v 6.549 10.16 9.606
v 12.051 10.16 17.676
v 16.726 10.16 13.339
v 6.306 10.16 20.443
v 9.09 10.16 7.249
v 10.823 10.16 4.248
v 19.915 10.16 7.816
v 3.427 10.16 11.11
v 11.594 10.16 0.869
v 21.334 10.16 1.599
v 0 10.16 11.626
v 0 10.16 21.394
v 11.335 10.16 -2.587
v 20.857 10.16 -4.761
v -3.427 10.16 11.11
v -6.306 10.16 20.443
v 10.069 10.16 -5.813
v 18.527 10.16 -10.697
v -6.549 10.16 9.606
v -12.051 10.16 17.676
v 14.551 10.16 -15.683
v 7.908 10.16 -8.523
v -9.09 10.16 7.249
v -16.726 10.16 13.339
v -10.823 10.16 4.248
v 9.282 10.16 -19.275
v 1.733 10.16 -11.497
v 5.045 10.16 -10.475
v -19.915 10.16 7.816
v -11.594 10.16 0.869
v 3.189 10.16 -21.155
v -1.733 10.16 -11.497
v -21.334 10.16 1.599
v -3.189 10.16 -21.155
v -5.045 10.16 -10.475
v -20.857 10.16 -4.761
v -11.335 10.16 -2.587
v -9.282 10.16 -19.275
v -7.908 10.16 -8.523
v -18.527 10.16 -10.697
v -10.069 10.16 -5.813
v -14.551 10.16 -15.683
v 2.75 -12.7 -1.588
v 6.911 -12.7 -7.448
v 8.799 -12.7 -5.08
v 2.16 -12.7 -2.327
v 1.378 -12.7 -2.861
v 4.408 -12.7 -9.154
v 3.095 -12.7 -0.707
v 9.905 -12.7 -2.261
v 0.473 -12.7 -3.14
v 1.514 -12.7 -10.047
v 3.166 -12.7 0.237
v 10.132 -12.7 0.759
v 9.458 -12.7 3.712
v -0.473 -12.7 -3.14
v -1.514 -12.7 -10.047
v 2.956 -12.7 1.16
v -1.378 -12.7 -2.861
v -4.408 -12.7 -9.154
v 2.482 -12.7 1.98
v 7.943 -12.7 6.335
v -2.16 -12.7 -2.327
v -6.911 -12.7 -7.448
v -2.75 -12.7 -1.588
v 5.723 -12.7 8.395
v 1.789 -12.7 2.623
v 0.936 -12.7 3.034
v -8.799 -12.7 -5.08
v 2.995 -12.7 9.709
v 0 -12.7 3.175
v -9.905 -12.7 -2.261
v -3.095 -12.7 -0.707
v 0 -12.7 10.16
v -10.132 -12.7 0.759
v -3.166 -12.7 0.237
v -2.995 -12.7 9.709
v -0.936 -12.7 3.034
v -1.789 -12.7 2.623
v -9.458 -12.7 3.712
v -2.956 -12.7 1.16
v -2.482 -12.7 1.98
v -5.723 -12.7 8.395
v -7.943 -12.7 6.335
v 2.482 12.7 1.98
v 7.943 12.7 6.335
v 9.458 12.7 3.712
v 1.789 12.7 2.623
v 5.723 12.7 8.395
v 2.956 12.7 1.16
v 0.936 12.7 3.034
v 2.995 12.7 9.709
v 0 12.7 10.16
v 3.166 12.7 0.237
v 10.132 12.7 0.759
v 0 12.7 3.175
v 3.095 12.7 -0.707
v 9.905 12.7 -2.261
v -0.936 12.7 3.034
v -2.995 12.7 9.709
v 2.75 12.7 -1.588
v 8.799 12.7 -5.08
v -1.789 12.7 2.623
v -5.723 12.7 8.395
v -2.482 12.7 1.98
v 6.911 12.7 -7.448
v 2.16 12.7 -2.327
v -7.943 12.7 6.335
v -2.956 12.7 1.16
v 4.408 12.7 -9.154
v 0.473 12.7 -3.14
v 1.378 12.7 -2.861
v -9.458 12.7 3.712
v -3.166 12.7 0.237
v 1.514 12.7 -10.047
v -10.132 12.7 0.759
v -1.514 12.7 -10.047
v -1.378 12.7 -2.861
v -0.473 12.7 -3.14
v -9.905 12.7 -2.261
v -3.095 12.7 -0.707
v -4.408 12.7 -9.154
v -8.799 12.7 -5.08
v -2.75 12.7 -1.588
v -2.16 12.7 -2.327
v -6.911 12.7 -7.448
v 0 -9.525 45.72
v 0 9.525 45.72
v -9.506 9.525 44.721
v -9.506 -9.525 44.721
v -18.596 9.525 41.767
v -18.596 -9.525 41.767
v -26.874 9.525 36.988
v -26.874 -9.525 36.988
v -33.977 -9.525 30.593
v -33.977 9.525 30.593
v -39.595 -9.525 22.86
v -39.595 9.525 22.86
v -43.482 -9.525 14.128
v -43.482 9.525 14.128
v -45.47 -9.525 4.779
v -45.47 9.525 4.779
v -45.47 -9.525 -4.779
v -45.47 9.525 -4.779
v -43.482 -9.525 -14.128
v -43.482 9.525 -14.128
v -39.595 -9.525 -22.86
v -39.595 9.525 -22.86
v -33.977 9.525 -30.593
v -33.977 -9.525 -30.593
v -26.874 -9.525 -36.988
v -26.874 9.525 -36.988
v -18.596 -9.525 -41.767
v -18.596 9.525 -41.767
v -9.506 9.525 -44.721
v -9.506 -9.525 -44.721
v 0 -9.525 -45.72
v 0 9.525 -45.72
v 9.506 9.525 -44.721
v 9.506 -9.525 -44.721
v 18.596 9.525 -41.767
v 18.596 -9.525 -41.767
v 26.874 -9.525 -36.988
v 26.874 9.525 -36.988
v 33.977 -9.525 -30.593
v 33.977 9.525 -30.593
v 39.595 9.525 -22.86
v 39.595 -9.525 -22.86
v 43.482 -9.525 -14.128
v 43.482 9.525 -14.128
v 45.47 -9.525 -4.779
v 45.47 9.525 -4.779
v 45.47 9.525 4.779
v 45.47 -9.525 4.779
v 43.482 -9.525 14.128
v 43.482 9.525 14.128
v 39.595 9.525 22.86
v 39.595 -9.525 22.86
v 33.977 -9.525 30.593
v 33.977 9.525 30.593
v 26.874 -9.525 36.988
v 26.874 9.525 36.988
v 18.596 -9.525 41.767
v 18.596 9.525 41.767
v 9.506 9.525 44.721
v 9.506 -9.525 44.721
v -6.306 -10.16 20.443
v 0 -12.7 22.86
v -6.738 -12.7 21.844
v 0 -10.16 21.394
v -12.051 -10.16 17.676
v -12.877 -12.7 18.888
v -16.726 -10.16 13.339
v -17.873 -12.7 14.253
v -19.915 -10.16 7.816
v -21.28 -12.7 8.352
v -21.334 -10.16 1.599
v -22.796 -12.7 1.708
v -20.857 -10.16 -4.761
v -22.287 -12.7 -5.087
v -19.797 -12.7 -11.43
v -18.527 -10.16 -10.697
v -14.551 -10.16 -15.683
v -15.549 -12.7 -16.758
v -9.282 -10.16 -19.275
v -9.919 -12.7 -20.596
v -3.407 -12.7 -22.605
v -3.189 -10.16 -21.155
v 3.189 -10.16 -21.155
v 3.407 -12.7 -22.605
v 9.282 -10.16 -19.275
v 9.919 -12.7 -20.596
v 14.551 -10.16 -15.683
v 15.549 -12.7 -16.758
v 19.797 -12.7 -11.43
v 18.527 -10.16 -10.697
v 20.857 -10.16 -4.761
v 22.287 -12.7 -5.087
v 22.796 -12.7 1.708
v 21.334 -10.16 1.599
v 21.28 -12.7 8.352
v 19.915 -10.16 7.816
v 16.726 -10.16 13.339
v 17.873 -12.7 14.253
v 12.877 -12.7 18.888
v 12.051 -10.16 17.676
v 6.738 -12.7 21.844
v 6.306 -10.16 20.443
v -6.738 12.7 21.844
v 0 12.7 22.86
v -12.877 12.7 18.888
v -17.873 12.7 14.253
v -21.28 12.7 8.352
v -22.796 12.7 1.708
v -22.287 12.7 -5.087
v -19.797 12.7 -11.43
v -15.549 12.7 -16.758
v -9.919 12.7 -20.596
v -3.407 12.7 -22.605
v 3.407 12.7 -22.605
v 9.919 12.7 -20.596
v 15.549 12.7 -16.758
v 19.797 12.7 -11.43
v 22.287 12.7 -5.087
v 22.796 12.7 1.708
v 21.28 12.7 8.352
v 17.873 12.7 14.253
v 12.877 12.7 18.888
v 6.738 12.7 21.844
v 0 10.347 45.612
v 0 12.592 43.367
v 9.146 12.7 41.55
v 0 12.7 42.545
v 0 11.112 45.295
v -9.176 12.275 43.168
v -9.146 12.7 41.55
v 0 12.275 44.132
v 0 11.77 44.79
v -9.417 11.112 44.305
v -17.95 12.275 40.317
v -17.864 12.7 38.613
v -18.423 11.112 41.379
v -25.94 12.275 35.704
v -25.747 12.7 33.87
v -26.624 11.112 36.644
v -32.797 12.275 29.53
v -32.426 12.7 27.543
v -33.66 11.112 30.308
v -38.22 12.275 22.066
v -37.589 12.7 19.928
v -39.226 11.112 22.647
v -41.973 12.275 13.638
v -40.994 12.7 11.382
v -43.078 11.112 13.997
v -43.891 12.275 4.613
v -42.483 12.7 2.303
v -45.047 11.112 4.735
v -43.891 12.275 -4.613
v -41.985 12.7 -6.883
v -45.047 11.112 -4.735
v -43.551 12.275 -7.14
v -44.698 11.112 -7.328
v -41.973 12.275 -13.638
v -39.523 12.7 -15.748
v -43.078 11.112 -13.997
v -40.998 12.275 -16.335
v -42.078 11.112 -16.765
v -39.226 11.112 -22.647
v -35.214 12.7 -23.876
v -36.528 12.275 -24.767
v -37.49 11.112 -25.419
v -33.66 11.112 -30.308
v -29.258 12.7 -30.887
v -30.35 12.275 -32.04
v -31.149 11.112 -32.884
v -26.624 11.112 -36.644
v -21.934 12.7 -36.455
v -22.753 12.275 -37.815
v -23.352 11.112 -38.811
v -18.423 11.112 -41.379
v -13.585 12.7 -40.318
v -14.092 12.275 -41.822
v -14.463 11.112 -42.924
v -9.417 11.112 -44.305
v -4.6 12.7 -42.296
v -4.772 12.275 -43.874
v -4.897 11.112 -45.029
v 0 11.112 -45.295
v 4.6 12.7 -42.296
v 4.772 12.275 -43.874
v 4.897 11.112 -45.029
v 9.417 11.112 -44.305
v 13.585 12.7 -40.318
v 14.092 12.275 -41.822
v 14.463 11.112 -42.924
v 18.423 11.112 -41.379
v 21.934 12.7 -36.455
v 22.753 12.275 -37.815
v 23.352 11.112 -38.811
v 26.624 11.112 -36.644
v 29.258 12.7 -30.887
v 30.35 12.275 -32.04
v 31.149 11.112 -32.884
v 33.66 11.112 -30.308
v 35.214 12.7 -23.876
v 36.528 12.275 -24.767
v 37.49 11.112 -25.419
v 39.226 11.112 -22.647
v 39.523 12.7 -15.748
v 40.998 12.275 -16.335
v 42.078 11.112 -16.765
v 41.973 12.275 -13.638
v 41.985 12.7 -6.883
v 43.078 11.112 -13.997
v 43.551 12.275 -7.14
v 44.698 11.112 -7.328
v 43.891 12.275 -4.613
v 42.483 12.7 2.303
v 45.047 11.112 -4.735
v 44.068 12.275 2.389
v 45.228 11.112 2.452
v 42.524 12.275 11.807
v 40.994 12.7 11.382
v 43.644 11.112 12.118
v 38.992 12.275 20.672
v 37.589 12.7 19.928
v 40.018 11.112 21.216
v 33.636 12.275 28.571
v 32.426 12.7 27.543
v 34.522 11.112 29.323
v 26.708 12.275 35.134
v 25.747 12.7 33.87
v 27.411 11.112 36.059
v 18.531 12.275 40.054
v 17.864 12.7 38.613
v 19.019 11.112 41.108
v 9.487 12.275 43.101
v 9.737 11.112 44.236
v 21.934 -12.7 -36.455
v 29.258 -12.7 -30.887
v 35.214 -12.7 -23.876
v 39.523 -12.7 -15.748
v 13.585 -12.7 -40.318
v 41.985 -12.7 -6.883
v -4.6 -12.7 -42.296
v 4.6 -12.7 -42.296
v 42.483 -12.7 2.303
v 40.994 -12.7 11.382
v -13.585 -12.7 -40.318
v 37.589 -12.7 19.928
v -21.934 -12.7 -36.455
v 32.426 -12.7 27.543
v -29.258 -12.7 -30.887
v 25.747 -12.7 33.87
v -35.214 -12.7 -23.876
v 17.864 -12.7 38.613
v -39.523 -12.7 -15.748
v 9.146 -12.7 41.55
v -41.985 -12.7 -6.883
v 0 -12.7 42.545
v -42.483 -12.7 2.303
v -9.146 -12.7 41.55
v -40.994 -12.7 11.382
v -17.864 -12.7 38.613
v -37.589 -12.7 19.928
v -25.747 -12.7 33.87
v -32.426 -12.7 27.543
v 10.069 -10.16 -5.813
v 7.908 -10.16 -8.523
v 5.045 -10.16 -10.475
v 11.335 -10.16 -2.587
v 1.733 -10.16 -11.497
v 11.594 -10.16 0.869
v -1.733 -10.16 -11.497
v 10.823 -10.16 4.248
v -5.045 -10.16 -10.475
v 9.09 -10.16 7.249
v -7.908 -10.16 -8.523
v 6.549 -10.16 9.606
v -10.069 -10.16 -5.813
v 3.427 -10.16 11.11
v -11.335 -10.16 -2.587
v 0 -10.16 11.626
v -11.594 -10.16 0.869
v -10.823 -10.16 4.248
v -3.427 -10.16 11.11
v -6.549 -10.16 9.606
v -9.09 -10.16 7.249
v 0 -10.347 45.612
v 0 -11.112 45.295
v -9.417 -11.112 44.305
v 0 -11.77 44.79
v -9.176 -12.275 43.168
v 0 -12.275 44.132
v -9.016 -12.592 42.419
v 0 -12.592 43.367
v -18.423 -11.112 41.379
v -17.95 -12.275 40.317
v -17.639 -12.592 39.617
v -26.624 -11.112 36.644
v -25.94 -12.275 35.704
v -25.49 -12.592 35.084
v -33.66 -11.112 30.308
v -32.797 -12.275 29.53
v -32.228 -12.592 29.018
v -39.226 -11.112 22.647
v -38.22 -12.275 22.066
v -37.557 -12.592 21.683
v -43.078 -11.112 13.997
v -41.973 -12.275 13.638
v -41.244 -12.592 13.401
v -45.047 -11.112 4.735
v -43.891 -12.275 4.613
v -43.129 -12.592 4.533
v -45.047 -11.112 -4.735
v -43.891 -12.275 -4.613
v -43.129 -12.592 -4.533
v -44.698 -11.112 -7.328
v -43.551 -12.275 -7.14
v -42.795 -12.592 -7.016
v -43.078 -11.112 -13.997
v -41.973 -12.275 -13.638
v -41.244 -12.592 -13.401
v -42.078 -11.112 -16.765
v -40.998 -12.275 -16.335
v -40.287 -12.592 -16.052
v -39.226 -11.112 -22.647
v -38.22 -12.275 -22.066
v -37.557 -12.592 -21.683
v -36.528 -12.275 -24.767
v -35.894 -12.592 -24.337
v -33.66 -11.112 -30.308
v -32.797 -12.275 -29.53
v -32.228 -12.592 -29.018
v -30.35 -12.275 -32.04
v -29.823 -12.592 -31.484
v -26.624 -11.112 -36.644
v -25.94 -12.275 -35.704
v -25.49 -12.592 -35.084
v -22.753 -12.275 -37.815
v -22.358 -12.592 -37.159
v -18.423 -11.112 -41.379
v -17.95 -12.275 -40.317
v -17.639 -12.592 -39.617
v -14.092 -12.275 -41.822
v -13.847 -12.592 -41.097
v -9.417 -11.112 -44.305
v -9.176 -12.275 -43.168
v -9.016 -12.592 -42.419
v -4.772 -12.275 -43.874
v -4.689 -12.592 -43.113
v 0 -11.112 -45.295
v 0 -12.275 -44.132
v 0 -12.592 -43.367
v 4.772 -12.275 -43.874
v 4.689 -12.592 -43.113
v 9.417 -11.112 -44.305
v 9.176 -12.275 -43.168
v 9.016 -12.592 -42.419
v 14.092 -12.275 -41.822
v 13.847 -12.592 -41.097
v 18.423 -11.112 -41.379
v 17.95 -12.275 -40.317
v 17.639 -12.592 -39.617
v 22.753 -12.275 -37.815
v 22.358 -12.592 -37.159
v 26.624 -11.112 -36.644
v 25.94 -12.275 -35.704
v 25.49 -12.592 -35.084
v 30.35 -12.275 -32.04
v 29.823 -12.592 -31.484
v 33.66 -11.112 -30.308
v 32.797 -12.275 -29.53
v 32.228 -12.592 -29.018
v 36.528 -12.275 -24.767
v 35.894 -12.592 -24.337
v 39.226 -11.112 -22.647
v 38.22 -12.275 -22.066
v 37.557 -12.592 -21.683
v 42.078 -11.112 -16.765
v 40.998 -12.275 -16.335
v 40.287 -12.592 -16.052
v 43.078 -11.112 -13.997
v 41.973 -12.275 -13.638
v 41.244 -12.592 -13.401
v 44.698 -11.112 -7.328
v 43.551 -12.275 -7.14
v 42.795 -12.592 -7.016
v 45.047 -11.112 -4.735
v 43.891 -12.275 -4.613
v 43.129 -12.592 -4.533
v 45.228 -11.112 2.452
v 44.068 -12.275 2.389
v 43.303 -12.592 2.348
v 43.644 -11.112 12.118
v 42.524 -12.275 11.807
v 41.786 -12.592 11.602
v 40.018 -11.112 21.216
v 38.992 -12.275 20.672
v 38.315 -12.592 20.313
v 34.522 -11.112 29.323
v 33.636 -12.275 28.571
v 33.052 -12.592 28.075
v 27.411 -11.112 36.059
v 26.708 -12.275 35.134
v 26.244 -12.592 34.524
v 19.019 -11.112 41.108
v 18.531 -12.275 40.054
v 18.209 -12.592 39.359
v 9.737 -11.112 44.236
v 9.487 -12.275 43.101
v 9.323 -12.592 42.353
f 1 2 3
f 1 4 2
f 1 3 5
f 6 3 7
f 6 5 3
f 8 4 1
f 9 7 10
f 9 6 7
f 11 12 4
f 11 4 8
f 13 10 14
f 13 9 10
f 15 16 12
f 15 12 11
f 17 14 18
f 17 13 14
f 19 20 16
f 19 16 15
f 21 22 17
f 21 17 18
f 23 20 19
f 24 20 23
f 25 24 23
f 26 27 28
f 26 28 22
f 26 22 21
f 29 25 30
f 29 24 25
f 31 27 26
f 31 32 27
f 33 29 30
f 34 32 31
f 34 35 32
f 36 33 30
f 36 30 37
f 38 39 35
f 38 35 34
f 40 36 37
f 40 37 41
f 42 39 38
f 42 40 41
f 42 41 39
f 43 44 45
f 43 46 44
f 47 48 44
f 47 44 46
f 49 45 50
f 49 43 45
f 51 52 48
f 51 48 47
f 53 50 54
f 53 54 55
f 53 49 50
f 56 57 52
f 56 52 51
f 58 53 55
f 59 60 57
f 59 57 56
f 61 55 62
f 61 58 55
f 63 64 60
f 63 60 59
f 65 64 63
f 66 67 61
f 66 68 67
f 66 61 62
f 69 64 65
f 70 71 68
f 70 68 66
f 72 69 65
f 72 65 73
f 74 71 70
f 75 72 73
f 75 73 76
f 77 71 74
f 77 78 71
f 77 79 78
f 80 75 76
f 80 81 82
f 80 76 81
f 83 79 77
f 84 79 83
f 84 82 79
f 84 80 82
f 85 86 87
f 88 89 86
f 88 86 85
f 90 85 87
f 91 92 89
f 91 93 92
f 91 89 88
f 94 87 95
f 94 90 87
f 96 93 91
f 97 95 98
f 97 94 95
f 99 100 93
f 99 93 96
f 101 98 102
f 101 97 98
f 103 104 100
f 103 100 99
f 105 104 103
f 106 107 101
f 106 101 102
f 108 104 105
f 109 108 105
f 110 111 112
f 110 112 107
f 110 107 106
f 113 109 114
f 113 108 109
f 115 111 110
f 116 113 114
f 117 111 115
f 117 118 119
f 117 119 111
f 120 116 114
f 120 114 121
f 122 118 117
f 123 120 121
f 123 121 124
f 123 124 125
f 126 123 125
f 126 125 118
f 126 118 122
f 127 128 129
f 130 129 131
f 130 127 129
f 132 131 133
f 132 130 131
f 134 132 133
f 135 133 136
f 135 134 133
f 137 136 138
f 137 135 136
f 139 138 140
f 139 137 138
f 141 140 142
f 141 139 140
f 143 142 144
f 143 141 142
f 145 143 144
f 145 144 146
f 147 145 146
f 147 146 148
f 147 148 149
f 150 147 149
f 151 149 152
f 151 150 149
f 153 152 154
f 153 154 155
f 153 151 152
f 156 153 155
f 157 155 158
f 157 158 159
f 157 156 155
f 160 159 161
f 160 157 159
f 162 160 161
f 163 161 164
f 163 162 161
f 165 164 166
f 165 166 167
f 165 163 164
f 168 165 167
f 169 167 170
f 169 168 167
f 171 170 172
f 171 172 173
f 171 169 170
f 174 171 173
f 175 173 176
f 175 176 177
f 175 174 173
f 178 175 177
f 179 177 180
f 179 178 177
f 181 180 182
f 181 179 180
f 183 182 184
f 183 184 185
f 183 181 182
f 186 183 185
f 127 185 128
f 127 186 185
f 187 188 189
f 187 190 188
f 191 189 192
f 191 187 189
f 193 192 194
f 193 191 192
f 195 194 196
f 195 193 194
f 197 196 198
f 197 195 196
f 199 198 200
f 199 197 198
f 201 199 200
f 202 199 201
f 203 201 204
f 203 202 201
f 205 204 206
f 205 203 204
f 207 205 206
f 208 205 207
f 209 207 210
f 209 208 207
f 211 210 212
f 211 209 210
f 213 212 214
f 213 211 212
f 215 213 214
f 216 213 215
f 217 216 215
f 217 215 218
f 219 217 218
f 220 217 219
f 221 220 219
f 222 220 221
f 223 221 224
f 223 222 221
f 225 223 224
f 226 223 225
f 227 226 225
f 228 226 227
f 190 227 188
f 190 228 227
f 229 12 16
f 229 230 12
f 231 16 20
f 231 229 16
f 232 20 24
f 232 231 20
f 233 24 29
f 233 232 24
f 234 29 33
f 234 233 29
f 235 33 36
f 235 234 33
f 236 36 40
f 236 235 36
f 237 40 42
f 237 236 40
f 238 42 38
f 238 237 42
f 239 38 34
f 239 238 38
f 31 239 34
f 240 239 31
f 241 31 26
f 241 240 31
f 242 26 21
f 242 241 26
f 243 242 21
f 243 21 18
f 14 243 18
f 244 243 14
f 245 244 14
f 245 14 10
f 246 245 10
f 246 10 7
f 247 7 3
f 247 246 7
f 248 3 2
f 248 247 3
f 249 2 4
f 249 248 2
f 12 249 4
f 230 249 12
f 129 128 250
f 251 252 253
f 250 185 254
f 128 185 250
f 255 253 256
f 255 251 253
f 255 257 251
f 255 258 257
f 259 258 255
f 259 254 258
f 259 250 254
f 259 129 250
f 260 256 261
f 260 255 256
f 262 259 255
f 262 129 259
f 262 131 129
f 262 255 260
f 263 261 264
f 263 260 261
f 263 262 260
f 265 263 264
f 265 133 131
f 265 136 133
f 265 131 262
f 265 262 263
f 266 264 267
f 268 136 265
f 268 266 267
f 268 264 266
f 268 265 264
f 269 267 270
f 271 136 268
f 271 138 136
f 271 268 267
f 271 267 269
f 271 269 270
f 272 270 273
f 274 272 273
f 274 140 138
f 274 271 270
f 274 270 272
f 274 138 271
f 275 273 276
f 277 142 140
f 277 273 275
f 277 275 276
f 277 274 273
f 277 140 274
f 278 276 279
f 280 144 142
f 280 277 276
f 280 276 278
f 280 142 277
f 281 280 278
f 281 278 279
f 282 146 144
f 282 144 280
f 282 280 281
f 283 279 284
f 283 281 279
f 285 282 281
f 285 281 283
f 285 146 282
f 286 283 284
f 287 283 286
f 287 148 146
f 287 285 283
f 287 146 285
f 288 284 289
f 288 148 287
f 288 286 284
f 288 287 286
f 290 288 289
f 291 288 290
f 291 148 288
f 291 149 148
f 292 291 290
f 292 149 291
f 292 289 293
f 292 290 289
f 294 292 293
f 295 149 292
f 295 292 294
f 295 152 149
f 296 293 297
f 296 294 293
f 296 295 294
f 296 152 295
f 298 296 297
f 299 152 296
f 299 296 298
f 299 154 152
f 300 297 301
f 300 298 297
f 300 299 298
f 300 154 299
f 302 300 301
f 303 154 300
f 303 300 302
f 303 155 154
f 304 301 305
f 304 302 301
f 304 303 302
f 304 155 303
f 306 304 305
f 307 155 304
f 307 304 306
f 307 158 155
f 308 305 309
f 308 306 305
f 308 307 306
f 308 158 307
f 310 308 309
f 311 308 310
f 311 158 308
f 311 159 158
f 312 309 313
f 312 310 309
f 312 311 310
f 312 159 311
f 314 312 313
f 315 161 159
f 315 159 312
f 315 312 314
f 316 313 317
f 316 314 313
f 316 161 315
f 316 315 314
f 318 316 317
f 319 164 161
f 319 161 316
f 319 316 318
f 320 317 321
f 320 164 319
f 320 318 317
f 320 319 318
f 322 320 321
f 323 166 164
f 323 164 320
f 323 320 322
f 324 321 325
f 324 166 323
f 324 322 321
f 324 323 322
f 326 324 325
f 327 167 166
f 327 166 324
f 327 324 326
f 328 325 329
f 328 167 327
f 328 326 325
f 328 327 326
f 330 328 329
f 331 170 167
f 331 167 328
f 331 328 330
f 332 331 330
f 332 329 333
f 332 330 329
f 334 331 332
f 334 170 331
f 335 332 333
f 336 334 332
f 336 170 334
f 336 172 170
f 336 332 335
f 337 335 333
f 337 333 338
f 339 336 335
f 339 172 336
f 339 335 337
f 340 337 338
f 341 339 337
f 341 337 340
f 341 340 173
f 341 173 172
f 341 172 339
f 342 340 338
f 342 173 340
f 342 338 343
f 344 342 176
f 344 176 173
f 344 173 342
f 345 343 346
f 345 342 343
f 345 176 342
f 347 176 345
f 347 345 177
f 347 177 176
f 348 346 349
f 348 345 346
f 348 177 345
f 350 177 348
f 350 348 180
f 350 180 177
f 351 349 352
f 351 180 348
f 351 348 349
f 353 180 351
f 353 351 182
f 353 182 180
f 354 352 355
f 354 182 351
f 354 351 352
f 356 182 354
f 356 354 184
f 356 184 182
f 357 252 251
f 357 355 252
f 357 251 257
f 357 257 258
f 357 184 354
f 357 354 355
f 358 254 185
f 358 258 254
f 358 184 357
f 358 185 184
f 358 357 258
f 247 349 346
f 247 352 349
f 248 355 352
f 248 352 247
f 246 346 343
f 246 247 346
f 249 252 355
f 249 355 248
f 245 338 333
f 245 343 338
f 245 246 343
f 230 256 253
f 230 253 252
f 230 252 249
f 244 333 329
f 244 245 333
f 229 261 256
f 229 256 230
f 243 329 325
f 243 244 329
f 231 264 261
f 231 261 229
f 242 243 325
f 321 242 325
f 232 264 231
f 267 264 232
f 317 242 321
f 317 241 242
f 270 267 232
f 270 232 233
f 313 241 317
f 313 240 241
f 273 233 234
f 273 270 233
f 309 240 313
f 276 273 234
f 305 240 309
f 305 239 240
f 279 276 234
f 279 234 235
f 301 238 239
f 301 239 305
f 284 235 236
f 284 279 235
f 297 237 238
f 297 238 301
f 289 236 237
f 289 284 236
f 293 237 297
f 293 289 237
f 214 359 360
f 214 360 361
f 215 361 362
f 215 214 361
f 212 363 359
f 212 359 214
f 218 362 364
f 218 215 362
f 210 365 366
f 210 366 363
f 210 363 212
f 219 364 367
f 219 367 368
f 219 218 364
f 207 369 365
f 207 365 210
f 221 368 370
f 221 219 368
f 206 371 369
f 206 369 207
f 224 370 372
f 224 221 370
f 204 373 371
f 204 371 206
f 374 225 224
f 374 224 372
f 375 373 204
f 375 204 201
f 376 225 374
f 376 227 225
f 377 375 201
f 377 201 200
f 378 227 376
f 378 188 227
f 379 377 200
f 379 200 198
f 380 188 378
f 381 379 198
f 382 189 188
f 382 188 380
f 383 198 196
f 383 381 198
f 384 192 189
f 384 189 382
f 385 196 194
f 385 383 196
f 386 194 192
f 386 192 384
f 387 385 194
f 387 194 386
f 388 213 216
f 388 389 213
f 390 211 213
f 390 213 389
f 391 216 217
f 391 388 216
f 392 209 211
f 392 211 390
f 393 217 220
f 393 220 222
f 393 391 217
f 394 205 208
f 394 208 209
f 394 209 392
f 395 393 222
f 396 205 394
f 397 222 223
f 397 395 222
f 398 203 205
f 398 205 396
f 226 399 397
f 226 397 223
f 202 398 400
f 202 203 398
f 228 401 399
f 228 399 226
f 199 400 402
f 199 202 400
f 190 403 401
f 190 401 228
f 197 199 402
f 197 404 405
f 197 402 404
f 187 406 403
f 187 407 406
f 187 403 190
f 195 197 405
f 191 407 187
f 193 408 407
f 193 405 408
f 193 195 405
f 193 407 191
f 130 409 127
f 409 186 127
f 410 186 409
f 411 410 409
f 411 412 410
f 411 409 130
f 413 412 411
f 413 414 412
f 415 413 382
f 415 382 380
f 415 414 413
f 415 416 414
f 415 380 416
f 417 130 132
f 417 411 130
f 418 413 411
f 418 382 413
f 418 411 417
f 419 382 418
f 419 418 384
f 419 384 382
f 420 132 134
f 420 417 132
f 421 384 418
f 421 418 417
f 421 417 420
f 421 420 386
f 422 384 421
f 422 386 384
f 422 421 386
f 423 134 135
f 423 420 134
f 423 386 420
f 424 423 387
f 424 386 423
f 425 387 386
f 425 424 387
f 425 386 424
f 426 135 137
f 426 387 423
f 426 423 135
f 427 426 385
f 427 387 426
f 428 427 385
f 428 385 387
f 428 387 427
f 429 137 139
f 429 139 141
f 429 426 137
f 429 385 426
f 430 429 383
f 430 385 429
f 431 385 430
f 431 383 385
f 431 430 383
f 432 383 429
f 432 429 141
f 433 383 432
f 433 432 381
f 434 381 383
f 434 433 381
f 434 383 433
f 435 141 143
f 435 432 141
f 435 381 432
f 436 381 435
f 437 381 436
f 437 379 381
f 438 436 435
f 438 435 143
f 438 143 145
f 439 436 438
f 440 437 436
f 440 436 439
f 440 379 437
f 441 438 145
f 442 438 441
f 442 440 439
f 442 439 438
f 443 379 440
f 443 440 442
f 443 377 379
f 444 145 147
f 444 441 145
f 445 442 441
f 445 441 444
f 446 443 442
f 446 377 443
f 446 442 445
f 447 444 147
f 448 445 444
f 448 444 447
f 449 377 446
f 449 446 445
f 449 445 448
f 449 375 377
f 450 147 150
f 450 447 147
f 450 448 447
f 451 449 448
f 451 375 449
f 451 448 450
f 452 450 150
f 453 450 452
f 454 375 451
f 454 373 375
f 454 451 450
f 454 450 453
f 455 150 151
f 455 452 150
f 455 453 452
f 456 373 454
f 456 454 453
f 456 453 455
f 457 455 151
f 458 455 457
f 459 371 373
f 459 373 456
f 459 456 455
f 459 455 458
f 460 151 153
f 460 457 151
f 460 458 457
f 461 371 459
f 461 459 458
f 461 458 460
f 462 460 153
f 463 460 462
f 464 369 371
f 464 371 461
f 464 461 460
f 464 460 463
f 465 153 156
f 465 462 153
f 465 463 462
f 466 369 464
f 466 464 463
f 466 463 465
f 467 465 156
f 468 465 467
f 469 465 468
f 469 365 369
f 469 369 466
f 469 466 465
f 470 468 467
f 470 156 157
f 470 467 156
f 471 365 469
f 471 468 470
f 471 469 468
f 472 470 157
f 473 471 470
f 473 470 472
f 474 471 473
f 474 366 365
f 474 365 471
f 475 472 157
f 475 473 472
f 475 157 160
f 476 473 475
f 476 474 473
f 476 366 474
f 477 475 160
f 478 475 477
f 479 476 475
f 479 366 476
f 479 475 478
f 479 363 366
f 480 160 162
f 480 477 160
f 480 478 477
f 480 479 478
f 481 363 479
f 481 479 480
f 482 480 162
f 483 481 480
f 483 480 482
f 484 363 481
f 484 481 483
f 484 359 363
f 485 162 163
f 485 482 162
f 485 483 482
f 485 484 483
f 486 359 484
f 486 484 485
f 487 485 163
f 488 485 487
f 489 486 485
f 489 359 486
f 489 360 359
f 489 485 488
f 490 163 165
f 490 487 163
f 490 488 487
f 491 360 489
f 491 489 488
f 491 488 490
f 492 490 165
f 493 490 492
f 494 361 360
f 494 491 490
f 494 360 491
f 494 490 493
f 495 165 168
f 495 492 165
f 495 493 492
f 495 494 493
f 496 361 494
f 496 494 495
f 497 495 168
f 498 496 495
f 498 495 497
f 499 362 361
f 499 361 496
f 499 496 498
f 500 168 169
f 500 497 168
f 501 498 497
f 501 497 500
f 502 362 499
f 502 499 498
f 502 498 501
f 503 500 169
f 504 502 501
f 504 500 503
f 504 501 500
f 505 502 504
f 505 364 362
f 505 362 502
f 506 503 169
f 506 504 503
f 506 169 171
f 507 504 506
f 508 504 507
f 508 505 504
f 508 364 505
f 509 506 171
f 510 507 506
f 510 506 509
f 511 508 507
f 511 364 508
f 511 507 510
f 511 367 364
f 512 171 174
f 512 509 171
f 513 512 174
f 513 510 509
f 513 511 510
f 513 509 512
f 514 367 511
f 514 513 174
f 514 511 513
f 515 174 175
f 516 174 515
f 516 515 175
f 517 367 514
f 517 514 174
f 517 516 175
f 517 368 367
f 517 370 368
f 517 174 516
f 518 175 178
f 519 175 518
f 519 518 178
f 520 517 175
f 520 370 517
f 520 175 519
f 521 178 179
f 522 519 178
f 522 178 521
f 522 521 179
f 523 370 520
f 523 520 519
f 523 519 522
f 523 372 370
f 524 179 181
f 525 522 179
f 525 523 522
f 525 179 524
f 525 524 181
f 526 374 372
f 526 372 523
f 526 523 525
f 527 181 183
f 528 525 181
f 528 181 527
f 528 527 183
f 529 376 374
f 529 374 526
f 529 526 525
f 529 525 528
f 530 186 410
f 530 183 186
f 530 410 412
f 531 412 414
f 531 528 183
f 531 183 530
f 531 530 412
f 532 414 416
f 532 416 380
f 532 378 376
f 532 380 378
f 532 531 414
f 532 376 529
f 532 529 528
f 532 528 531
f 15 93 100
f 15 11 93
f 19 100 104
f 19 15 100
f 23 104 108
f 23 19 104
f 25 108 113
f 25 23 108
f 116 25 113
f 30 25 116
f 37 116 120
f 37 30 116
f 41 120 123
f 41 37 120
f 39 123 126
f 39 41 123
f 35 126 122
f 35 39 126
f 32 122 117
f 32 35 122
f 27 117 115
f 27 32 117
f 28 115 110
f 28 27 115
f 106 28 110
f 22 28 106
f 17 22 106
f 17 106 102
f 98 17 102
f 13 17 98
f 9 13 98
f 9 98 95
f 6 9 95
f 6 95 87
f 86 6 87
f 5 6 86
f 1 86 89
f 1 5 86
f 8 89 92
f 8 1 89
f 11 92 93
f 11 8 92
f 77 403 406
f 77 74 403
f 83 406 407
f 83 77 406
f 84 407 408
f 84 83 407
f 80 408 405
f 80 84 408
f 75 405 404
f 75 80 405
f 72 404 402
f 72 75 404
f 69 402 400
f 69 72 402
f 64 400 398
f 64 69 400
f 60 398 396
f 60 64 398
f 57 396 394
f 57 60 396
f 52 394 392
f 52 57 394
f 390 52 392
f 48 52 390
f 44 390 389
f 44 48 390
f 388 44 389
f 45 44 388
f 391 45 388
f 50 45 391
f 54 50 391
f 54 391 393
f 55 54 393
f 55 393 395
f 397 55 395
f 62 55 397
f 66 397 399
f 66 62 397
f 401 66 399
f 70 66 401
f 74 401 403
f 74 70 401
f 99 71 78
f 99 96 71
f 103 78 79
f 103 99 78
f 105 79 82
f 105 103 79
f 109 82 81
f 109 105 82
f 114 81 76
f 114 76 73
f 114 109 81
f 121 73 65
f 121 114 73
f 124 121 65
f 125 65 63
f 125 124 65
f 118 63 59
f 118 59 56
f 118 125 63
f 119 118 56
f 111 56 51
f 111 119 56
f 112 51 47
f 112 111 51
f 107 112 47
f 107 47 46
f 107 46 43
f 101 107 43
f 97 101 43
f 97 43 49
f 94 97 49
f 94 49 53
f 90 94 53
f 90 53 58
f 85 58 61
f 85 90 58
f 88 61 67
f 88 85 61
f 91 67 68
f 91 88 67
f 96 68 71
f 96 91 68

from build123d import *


with BuildPart() as f1:
    # F0 (on Right) → F1 (revolve)
    with BuildSketch(Plane.YZ):
        with BuildLine():
            Line((-12.7, 3.175), (12.7, 3.175))
            Line((12.7, 3.175), (12.7, 10.16))
            Line((12.7, 10.16), (10.16, 11.62647))
            Line((10.16, 11.62647), (10.16, 21.39353))
            Line((10.16, 21.39353), (12.7, 22.86))
            Line((12.7, 22.86), (12.7, 42.545))
            ThreePointArc((12.7, 42.545), (11.770064, 44.790064), (9.525, 45.72))
            Line((9.525, 45.72), (-9.525, 45.72))
            ThreePointArc((-9.525, 45.72), (-11.770064, 44.790064), (-12.7, 42.545))
            Line((-12.7, 42.545), (-12.7, 22.86))
            Line((-12.7, 22.86), (-10.16, 21.39353))
            Line((-10.16, 21.39353), (-10.16, 11.62647))
            Line((-10.16, 11.62647), (-12.7, 10.16))
            Line((-12.7, 10.16), (-12.7, 3.175))
        make_face()
    revolve(axis=Axis((0, -22.93878, 0), (0, -1, 0)))


with BuildPart() as f2_1:
    # F2: copy of F1
    add(f1.part)


solid = f2_1.part
